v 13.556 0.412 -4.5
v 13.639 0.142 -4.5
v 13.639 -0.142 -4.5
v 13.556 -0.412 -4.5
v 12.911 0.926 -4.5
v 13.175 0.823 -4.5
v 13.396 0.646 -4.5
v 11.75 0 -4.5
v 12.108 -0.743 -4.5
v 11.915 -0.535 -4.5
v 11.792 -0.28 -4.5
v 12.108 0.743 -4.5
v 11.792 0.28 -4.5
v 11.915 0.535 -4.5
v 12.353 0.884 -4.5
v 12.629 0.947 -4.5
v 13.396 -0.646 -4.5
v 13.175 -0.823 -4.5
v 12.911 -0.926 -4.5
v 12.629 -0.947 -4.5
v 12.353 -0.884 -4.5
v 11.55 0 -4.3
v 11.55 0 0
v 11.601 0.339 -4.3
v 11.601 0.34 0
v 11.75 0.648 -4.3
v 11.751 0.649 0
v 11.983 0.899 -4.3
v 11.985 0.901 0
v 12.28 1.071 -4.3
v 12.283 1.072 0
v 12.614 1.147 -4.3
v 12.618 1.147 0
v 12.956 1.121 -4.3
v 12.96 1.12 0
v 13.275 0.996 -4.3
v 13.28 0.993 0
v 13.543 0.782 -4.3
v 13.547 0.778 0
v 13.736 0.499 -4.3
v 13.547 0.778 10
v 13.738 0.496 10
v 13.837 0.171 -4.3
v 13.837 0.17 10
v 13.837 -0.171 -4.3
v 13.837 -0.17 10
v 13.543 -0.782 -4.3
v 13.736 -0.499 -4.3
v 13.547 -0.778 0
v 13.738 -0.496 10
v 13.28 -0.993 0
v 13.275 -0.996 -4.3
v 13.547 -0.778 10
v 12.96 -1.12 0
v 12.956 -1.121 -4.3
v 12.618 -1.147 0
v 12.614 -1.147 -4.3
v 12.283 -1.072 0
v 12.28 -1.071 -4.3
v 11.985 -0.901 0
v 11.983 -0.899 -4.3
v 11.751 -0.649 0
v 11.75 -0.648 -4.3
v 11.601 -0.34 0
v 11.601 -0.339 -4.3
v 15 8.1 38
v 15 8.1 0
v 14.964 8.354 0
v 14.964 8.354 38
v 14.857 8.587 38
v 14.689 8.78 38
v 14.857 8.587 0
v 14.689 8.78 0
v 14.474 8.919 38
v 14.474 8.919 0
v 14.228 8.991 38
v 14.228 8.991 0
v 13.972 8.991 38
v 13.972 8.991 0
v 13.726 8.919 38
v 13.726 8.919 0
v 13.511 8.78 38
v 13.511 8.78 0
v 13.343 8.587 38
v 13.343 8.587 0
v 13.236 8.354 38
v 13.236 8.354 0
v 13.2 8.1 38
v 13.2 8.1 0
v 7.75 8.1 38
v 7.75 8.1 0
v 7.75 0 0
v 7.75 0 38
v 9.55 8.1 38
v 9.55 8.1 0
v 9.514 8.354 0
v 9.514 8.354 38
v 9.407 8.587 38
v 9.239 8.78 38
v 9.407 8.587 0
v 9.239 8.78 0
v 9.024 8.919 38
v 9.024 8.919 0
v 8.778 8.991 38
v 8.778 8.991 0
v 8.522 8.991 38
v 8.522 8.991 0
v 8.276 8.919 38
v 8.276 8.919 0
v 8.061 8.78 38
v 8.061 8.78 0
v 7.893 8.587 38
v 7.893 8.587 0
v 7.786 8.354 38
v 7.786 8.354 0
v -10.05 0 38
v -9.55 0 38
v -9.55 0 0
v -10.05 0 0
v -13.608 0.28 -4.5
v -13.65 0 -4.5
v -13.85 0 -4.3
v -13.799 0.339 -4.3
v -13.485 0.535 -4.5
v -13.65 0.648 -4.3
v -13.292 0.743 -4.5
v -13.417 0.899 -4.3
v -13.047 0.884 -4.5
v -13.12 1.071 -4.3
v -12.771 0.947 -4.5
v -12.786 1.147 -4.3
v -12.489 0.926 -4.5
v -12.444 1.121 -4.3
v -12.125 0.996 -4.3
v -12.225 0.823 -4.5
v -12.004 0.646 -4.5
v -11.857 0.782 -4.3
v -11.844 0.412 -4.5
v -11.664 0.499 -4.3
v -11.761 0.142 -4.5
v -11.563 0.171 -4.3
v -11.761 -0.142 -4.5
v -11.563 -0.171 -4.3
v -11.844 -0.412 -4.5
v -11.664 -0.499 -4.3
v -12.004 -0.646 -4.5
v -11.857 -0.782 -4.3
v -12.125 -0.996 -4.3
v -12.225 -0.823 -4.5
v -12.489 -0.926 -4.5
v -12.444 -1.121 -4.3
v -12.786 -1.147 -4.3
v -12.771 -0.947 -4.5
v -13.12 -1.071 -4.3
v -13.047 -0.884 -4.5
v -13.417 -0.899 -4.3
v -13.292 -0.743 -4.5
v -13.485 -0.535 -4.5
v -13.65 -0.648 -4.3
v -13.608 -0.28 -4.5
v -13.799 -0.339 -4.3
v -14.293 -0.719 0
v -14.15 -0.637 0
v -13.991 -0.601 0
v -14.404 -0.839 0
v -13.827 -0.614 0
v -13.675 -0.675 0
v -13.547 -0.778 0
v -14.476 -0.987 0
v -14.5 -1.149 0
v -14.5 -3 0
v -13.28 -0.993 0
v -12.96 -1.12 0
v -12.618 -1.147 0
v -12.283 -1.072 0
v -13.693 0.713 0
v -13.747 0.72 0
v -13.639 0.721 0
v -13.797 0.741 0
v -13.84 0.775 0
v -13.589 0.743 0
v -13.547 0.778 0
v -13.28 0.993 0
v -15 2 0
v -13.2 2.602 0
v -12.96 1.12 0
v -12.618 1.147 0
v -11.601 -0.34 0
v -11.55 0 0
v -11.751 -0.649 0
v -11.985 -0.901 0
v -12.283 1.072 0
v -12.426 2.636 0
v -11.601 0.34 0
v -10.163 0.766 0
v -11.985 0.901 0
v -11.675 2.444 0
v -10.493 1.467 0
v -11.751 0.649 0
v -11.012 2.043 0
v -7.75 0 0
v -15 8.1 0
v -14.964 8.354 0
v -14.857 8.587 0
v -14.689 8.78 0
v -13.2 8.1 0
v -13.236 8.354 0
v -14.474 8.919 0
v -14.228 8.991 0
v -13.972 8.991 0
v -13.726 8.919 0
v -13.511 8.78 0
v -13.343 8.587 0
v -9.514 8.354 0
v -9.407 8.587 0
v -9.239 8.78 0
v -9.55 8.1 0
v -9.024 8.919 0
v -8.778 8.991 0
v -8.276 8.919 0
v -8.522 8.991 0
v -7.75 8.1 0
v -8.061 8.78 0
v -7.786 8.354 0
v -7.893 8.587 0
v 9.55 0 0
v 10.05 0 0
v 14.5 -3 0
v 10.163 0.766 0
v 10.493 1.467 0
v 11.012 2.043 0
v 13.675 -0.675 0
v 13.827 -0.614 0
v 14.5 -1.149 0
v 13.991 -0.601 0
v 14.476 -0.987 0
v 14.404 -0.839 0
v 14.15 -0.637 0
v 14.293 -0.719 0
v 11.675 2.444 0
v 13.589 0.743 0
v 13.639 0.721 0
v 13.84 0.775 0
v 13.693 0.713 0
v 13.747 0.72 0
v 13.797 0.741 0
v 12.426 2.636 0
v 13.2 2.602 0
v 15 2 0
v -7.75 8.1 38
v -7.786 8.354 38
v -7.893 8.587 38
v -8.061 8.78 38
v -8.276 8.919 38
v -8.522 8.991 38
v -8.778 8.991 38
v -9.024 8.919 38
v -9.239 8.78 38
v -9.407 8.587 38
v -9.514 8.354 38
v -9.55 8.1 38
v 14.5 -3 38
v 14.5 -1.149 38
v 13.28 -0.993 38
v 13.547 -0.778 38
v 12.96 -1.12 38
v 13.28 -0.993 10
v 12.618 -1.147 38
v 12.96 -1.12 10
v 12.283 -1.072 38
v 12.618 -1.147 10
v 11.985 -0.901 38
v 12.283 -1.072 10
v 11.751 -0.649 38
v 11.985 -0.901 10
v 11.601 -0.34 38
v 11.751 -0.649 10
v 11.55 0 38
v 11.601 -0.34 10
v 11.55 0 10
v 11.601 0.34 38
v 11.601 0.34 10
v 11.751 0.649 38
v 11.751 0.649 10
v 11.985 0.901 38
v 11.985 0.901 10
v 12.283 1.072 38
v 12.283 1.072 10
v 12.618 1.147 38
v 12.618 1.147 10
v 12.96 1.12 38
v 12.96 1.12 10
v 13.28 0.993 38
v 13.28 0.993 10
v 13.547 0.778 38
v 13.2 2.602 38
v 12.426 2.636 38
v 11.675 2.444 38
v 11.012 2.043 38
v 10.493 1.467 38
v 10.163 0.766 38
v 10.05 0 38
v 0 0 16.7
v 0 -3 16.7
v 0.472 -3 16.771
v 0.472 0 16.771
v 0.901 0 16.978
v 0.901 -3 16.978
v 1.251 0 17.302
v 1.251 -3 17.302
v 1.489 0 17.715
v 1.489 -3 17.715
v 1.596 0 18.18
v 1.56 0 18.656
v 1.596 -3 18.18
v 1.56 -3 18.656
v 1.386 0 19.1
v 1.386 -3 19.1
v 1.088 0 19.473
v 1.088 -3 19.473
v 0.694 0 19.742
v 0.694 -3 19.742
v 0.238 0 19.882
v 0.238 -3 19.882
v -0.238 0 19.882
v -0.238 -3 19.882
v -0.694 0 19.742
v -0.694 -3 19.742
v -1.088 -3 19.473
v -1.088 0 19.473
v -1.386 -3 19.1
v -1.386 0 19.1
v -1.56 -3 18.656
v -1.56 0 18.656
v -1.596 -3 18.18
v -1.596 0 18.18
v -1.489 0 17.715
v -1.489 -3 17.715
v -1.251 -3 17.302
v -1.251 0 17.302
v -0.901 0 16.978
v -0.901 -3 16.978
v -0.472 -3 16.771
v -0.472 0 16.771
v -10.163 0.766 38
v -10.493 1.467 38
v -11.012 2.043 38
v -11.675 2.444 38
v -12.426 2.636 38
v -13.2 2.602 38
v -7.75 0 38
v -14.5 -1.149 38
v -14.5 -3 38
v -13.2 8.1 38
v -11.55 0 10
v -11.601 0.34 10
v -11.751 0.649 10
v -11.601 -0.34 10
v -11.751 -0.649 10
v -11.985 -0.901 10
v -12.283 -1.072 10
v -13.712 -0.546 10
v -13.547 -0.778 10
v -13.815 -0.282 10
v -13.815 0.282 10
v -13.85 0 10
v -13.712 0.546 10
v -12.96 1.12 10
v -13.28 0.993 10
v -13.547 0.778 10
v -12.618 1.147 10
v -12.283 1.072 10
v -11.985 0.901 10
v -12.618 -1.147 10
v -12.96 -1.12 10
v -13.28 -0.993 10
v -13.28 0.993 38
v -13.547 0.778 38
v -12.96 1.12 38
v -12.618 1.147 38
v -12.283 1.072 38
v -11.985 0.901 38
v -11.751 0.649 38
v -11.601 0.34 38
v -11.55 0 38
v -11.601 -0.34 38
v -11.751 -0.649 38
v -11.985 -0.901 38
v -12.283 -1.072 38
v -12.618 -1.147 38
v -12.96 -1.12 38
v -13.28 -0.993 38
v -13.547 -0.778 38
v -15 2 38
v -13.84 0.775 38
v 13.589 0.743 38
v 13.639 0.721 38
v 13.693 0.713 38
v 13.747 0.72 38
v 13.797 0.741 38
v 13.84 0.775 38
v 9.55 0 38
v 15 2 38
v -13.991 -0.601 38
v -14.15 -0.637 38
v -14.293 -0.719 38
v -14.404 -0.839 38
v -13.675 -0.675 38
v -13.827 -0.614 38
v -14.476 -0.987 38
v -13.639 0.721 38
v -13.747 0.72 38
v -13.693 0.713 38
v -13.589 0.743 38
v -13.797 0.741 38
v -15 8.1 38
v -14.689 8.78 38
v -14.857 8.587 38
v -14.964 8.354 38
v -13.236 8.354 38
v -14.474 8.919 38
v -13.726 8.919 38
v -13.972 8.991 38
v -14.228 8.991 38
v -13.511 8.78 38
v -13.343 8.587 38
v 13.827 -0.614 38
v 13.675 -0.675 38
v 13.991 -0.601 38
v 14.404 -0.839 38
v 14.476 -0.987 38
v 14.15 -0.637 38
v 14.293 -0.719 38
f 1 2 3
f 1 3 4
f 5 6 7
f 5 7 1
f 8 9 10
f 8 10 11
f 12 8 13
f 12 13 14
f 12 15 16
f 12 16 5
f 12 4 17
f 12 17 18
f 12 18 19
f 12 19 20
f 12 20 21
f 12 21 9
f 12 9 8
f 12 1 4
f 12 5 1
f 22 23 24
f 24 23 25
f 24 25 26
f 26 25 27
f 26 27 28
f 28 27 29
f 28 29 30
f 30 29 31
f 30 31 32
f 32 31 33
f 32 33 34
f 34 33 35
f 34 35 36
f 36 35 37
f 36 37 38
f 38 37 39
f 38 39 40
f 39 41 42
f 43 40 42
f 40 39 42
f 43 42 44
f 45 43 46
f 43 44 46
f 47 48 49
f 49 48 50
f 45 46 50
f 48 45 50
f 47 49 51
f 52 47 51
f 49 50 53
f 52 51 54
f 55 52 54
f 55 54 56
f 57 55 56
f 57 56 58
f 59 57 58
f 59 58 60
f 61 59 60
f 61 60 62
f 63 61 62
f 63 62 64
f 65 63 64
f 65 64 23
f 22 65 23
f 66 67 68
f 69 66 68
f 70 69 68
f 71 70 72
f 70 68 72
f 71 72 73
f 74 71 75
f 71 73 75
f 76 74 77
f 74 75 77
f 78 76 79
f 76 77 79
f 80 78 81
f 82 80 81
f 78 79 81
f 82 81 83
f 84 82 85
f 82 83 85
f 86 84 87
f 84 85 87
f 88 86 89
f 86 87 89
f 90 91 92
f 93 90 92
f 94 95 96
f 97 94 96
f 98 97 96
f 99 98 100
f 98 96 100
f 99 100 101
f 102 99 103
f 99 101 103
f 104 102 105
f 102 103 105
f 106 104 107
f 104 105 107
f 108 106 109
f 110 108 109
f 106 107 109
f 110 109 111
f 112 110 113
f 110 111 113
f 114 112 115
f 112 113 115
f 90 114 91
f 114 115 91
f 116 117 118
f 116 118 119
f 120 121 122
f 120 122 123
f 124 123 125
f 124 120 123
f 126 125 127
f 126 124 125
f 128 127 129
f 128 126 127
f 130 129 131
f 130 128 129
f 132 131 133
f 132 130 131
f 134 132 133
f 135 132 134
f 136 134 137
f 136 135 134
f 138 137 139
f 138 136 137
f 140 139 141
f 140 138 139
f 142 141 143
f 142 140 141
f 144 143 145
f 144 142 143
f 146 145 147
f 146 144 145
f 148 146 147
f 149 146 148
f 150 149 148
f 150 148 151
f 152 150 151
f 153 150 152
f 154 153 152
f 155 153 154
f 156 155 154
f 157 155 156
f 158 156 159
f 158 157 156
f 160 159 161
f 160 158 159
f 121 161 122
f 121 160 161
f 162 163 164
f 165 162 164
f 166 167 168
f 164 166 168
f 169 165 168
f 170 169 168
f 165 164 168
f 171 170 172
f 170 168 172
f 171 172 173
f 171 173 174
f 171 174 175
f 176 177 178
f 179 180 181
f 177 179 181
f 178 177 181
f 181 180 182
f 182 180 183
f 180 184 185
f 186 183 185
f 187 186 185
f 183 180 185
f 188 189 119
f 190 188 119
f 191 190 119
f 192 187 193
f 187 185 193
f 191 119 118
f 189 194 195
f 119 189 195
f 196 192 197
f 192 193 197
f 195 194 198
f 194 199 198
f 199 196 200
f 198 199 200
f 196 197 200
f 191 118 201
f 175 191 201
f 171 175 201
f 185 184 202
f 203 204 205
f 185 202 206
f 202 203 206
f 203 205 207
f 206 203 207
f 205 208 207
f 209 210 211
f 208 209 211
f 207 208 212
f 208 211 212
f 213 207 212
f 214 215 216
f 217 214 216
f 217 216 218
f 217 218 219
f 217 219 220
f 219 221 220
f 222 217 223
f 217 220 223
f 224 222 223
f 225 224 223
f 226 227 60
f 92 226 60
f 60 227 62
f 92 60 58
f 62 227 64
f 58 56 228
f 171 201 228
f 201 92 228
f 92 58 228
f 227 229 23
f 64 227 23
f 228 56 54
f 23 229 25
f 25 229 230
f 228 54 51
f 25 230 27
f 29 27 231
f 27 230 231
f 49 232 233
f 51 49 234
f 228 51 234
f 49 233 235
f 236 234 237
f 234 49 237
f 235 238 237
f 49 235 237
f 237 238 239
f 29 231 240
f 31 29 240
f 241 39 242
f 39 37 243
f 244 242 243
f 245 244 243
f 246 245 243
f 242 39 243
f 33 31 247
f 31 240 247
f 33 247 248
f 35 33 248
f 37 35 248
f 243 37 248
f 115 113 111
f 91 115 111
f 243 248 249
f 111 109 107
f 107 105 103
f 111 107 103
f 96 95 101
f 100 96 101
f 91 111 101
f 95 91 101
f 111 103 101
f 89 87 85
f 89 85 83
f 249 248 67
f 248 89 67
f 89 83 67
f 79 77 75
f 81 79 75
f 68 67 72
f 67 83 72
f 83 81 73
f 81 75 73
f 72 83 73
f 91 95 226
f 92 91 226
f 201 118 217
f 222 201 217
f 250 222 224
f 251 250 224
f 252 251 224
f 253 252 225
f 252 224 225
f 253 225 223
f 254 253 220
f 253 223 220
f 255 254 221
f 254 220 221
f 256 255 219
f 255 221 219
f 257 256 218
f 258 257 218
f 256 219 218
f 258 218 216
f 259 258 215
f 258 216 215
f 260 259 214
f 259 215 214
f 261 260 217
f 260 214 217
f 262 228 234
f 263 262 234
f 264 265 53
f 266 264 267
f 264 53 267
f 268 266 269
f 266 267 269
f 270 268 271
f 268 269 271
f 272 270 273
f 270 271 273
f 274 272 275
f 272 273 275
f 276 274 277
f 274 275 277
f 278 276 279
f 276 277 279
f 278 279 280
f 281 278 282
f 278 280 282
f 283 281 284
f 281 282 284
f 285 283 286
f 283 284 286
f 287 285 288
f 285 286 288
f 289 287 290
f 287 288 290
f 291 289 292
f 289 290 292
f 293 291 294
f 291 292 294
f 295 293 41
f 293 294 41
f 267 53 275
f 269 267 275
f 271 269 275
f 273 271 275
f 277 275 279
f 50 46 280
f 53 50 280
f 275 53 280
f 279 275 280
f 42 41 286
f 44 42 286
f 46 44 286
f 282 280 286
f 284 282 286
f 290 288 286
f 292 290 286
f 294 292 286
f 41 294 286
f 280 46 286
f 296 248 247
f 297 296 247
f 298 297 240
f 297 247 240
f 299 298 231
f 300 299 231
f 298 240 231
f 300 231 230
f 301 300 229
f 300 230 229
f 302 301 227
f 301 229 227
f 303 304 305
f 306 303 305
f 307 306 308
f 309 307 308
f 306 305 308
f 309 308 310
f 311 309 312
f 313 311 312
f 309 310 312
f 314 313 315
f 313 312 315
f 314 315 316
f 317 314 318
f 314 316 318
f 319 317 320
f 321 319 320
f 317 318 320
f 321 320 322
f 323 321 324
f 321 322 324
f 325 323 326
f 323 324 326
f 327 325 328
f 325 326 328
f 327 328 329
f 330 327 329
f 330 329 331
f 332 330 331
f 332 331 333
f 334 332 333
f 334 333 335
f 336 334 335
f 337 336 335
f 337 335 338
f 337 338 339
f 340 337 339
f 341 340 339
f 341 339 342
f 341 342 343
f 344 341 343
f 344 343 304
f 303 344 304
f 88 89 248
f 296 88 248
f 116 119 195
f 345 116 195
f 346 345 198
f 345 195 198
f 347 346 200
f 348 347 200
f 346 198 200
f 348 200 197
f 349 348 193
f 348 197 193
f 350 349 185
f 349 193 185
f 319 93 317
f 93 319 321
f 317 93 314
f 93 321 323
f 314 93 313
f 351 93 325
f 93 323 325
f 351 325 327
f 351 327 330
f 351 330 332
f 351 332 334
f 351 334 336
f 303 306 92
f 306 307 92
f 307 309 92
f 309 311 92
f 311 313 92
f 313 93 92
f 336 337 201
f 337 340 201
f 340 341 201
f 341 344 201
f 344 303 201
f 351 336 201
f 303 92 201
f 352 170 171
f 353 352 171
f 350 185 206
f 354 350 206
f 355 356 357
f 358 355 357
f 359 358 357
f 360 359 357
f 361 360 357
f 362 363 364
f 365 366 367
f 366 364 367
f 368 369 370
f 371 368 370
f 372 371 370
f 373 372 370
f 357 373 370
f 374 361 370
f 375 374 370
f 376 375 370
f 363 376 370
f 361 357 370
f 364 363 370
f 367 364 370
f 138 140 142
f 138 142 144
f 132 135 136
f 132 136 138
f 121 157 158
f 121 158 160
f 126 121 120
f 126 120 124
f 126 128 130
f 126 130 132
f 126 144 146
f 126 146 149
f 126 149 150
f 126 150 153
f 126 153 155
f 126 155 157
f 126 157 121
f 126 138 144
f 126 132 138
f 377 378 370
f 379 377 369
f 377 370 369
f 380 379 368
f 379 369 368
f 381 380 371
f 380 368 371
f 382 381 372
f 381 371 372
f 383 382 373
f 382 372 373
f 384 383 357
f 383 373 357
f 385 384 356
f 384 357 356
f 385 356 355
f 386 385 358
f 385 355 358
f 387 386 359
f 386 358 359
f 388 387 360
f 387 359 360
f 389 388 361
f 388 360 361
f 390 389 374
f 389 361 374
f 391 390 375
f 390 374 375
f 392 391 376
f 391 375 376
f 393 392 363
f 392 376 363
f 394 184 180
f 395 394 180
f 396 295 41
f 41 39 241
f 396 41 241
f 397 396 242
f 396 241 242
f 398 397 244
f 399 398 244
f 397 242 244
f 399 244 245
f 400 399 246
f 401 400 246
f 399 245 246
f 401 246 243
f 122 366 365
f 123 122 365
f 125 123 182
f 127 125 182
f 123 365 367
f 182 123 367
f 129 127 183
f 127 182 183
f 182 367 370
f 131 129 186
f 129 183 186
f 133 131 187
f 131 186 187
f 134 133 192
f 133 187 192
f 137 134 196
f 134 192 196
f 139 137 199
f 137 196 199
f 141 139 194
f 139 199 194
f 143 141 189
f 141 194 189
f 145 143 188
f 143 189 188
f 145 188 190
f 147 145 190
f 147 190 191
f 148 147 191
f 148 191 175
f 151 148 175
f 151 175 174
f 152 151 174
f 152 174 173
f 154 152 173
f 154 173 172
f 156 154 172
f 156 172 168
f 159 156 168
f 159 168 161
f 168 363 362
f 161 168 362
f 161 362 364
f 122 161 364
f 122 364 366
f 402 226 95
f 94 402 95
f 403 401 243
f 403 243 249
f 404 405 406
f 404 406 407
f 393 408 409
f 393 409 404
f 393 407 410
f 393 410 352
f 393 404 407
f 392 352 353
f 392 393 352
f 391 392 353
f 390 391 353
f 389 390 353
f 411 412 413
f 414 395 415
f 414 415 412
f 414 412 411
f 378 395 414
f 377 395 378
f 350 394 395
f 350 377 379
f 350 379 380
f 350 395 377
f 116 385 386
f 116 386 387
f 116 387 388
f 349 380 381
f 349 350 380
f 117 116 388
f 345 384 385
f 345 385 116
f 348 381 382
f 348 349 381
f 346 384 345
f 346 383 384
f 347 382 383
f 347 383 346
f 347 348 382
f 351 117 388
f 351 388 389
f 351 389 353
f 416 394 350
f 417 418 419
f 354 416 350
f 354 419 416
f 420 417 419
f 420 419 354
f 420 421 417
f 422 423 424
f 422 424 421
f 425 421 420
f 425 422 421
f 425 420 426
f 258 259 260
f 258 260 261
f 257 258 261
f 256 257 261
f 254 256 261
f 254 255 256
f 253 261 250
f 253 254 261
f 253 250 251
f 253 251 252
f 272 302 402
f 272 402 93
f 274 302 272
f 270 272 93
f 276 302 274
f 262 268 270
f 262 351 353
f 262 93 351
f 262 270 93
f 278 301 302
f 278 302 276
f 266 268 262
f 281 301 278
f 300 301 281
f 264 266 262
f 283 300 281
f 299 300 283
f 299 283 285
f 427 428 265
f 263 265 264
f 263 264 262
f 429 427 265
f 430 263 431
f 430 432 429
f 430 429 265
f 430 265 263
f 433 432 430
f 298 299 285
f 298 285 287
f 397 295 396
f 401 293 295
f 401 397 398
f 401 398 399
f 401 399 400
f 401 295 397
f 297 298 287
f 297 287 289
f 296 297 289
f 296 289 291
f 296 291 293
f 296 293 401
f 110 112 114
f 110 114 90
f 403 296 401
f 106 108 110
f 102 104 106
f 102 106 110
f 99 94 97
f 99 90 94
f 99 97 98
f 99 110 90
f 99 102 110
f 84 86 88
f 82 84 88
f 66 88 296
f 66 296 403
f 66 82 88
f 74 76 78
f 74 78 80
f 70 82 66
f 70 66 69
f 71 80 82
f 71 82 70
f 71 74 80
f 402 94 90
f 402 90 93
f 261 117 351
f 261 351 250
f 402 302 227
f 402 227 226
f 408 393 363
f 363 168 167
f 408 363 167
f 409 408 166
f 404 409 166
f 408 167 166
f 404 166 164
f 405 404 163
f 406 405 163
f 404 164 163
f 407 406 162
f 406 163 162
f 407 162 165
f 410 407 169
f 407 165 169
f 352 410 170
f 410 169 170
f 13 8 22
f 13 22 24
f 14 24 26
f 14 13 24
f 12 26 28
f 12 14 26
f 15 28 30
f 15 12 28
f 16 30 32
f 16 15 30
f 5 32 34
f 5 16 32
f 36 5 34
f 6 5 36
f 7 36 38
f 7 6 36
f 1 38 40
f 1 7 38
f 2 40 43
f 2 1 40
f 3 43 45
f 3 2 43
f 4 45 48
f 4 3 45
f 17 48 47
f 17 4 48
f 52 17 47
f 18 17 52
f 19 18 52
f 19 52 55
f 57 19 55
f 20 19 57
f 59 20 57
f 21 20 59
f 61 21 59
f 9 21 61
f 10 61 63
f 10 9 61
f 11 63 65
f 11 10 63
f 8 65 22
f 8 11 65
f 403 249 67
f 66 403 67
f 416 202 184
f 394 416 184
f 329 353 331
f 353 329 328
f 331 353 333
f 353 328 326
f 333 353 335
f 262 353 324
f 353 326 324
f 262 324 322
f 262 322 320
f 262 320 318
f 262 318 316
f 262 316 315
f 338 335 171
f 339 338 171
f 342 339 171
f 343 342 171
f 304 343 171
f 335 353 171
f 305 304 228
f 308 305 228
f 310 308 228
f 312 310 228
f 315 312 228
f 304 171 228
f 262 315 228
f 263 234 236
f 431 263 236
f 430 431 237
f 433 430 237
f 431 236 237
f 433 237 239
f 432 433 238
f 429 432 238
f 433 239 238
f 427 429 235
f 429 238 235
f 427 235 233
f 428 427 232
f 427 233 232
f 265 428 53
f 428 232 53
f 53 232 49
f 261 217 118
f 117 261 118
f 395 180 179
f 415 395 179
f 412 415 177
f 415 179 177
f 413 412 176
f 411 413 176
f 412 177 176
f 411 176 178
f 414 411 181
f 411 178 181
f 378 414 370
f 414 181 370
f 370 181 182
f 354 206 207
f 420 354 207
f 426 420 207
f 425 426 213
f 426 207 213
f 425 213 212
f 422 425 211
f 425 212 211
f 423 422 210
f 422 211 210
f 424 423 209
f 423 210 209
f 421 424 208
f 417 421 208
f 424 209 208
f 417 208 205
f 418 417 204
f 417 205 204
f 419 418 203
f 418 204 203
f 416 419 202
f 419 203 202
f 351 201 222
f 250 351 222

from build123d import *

# Parameters (mm, degrees)
EXTRUDE_1_DEPTH      = 38
CUT_EXTRUDE_1_REACH  = 44.579
SKETCH_2_R           = 1.6
EXTRUDE_2_DEPTH      = 4.5
EXTRUDE_2_DEPTH_BACK = 10
SKETCH_3_R           = 1.15
CHAMFER_1_SIZE       = 0.2


with BuildPart() as part:
    # Эскиз1 → Бобышка-Вытянуть1 (new body)
    with BuildSketch(Plane.XY):
        with BuildLine():
            Line((-14.5, -3), (14.5, -3))
            Line((14.5, -3), (14.5, -1.148611647))
            ThreePointArc((14.5, -1.148611647), (14.150439729, -0.637384409), (13.547219321, -0.777637076))
            ThreePointArc((13.547219321, -0.777637076), (11.55, 0), (13.547219321, 0.777637076))
            ThreePointArc((13.547219321, 0.777637076), (13.692982689, 0.71288454), (13.839750373, 0.775327291))
            Line((13.839750373, 0.775327291), (15, 2))
            Line((15, 2), (15, 8.1))
            ThreePointArc((15, 8.1), (14.1, 9), (13.2, 8.1))
            Line((13.2, 8.1), (13.2, 2.602402736))
            ThreePointArc((13.2, 2.602402736), (11.012175957, 2.042975771), (10.05, 0))
            Line((10.05, 0), (9.55, 0))
            Line((9.55, 0), (9.55, 8.1))
            ThreePointArc((9.55, 8.1), (8.65, 9), (7.75, 8.1))
            Line((7.75, 8.1), (7.75, 0))
            Line((7.75, 0), (-7.75, 0))
            Line((-7.75, 0), (-7.75, 8.1))
            ThreePointArc((-7.75, 8.1), (-8.65, 9), (-9.55, 8.1))
            Line((-9.55, 8.1), (-9.55, 0))
            Line((-9.55, 0), (-10.05, 0))
            ThreePointArc((-10.05, 0), (-11.012175957, 2.042975771), (-13.2, 2.602402736))
            Line((-13.2, 2.602402736), (-13.2, 8.1))
            ThreePointArc((-13.2, 8.1), (-14.1, 9), (-15, 8.1))
            Line((-15, 8.1), (-15, 2))
            Line((-15, 2), (-13.839750373, 0.775327291))
            ThreePointArc((-13.839750373, 0.775327291), (-13.692982689, 0.71288454), (-13.547219321, 0.777637076))
            ThreePointArc((-13.547219321, 0.777637076), (-11.55, 0), (-13.547219321, -0.777637076))
            ThreePointArc((-13.547219321, -0.777637076), (-14.150439729, -0.637384409), (-14.5, -1.148611647))
            Line((-14.5, -1.148611647), (-14.5, -3))
        make_face()
    extrude(amount=EXTRUDE_1_DEPTH)

    # Эскиз2 → Вырез-Вытянуть1 (cut, up to next)
    with BuildSketch(Plane.XZ.offset(3), mode=Mode.PRIVATE) as cut_extrude_1_sk1:
        with Locations(Location((0, 18.3, 0), (0, 0, 270))):
            Circle(SKETCH_2_R)
    cut_extrude_1_tool1 = extrude(cut_extrude_1_sk1.sketch, amount=-CUT_EXTRUDE_1_REACH, mode=Mode.PRIVATE) & part.part
    add(cut_extrude_1_tool1.solids().sort_by_distance((0, -3, 18.3))[0], mode=Mode.SUBTRACT)

    # Эскиз3 → Бобышка-Вытянуть2 (add, two sides: drawn at the far end of the back side and taken through both)
    with BuildSketch(Plane(origin=(0, 0, 0), x_dir=(-1, 0, 0), z_dir=(0, 0, -1)).offset(-EXTRUDE_2_DEPTH_BACK)):
        with Locations((12.7, 0)):
            Circle(SKETCH_3_R)
        with Locations((-12.7, 0)):
            Circle(SKETCH_3_R)
    extrude(amount=EXTRUDE_2_DEPTH + EXTRUDE_2_DEPTH_BACK)

    # Фаска1
    chamfer_1_edges = [part.edges().sort_by_distance(p)[0] for p in [
        (-11.55, 0, -4.5),
        (13.85, 0, -4.5),
    ]]
    chamfer(chamfer_1_edges, length=CHAMFER_1_SIZE)


solid = part.part
